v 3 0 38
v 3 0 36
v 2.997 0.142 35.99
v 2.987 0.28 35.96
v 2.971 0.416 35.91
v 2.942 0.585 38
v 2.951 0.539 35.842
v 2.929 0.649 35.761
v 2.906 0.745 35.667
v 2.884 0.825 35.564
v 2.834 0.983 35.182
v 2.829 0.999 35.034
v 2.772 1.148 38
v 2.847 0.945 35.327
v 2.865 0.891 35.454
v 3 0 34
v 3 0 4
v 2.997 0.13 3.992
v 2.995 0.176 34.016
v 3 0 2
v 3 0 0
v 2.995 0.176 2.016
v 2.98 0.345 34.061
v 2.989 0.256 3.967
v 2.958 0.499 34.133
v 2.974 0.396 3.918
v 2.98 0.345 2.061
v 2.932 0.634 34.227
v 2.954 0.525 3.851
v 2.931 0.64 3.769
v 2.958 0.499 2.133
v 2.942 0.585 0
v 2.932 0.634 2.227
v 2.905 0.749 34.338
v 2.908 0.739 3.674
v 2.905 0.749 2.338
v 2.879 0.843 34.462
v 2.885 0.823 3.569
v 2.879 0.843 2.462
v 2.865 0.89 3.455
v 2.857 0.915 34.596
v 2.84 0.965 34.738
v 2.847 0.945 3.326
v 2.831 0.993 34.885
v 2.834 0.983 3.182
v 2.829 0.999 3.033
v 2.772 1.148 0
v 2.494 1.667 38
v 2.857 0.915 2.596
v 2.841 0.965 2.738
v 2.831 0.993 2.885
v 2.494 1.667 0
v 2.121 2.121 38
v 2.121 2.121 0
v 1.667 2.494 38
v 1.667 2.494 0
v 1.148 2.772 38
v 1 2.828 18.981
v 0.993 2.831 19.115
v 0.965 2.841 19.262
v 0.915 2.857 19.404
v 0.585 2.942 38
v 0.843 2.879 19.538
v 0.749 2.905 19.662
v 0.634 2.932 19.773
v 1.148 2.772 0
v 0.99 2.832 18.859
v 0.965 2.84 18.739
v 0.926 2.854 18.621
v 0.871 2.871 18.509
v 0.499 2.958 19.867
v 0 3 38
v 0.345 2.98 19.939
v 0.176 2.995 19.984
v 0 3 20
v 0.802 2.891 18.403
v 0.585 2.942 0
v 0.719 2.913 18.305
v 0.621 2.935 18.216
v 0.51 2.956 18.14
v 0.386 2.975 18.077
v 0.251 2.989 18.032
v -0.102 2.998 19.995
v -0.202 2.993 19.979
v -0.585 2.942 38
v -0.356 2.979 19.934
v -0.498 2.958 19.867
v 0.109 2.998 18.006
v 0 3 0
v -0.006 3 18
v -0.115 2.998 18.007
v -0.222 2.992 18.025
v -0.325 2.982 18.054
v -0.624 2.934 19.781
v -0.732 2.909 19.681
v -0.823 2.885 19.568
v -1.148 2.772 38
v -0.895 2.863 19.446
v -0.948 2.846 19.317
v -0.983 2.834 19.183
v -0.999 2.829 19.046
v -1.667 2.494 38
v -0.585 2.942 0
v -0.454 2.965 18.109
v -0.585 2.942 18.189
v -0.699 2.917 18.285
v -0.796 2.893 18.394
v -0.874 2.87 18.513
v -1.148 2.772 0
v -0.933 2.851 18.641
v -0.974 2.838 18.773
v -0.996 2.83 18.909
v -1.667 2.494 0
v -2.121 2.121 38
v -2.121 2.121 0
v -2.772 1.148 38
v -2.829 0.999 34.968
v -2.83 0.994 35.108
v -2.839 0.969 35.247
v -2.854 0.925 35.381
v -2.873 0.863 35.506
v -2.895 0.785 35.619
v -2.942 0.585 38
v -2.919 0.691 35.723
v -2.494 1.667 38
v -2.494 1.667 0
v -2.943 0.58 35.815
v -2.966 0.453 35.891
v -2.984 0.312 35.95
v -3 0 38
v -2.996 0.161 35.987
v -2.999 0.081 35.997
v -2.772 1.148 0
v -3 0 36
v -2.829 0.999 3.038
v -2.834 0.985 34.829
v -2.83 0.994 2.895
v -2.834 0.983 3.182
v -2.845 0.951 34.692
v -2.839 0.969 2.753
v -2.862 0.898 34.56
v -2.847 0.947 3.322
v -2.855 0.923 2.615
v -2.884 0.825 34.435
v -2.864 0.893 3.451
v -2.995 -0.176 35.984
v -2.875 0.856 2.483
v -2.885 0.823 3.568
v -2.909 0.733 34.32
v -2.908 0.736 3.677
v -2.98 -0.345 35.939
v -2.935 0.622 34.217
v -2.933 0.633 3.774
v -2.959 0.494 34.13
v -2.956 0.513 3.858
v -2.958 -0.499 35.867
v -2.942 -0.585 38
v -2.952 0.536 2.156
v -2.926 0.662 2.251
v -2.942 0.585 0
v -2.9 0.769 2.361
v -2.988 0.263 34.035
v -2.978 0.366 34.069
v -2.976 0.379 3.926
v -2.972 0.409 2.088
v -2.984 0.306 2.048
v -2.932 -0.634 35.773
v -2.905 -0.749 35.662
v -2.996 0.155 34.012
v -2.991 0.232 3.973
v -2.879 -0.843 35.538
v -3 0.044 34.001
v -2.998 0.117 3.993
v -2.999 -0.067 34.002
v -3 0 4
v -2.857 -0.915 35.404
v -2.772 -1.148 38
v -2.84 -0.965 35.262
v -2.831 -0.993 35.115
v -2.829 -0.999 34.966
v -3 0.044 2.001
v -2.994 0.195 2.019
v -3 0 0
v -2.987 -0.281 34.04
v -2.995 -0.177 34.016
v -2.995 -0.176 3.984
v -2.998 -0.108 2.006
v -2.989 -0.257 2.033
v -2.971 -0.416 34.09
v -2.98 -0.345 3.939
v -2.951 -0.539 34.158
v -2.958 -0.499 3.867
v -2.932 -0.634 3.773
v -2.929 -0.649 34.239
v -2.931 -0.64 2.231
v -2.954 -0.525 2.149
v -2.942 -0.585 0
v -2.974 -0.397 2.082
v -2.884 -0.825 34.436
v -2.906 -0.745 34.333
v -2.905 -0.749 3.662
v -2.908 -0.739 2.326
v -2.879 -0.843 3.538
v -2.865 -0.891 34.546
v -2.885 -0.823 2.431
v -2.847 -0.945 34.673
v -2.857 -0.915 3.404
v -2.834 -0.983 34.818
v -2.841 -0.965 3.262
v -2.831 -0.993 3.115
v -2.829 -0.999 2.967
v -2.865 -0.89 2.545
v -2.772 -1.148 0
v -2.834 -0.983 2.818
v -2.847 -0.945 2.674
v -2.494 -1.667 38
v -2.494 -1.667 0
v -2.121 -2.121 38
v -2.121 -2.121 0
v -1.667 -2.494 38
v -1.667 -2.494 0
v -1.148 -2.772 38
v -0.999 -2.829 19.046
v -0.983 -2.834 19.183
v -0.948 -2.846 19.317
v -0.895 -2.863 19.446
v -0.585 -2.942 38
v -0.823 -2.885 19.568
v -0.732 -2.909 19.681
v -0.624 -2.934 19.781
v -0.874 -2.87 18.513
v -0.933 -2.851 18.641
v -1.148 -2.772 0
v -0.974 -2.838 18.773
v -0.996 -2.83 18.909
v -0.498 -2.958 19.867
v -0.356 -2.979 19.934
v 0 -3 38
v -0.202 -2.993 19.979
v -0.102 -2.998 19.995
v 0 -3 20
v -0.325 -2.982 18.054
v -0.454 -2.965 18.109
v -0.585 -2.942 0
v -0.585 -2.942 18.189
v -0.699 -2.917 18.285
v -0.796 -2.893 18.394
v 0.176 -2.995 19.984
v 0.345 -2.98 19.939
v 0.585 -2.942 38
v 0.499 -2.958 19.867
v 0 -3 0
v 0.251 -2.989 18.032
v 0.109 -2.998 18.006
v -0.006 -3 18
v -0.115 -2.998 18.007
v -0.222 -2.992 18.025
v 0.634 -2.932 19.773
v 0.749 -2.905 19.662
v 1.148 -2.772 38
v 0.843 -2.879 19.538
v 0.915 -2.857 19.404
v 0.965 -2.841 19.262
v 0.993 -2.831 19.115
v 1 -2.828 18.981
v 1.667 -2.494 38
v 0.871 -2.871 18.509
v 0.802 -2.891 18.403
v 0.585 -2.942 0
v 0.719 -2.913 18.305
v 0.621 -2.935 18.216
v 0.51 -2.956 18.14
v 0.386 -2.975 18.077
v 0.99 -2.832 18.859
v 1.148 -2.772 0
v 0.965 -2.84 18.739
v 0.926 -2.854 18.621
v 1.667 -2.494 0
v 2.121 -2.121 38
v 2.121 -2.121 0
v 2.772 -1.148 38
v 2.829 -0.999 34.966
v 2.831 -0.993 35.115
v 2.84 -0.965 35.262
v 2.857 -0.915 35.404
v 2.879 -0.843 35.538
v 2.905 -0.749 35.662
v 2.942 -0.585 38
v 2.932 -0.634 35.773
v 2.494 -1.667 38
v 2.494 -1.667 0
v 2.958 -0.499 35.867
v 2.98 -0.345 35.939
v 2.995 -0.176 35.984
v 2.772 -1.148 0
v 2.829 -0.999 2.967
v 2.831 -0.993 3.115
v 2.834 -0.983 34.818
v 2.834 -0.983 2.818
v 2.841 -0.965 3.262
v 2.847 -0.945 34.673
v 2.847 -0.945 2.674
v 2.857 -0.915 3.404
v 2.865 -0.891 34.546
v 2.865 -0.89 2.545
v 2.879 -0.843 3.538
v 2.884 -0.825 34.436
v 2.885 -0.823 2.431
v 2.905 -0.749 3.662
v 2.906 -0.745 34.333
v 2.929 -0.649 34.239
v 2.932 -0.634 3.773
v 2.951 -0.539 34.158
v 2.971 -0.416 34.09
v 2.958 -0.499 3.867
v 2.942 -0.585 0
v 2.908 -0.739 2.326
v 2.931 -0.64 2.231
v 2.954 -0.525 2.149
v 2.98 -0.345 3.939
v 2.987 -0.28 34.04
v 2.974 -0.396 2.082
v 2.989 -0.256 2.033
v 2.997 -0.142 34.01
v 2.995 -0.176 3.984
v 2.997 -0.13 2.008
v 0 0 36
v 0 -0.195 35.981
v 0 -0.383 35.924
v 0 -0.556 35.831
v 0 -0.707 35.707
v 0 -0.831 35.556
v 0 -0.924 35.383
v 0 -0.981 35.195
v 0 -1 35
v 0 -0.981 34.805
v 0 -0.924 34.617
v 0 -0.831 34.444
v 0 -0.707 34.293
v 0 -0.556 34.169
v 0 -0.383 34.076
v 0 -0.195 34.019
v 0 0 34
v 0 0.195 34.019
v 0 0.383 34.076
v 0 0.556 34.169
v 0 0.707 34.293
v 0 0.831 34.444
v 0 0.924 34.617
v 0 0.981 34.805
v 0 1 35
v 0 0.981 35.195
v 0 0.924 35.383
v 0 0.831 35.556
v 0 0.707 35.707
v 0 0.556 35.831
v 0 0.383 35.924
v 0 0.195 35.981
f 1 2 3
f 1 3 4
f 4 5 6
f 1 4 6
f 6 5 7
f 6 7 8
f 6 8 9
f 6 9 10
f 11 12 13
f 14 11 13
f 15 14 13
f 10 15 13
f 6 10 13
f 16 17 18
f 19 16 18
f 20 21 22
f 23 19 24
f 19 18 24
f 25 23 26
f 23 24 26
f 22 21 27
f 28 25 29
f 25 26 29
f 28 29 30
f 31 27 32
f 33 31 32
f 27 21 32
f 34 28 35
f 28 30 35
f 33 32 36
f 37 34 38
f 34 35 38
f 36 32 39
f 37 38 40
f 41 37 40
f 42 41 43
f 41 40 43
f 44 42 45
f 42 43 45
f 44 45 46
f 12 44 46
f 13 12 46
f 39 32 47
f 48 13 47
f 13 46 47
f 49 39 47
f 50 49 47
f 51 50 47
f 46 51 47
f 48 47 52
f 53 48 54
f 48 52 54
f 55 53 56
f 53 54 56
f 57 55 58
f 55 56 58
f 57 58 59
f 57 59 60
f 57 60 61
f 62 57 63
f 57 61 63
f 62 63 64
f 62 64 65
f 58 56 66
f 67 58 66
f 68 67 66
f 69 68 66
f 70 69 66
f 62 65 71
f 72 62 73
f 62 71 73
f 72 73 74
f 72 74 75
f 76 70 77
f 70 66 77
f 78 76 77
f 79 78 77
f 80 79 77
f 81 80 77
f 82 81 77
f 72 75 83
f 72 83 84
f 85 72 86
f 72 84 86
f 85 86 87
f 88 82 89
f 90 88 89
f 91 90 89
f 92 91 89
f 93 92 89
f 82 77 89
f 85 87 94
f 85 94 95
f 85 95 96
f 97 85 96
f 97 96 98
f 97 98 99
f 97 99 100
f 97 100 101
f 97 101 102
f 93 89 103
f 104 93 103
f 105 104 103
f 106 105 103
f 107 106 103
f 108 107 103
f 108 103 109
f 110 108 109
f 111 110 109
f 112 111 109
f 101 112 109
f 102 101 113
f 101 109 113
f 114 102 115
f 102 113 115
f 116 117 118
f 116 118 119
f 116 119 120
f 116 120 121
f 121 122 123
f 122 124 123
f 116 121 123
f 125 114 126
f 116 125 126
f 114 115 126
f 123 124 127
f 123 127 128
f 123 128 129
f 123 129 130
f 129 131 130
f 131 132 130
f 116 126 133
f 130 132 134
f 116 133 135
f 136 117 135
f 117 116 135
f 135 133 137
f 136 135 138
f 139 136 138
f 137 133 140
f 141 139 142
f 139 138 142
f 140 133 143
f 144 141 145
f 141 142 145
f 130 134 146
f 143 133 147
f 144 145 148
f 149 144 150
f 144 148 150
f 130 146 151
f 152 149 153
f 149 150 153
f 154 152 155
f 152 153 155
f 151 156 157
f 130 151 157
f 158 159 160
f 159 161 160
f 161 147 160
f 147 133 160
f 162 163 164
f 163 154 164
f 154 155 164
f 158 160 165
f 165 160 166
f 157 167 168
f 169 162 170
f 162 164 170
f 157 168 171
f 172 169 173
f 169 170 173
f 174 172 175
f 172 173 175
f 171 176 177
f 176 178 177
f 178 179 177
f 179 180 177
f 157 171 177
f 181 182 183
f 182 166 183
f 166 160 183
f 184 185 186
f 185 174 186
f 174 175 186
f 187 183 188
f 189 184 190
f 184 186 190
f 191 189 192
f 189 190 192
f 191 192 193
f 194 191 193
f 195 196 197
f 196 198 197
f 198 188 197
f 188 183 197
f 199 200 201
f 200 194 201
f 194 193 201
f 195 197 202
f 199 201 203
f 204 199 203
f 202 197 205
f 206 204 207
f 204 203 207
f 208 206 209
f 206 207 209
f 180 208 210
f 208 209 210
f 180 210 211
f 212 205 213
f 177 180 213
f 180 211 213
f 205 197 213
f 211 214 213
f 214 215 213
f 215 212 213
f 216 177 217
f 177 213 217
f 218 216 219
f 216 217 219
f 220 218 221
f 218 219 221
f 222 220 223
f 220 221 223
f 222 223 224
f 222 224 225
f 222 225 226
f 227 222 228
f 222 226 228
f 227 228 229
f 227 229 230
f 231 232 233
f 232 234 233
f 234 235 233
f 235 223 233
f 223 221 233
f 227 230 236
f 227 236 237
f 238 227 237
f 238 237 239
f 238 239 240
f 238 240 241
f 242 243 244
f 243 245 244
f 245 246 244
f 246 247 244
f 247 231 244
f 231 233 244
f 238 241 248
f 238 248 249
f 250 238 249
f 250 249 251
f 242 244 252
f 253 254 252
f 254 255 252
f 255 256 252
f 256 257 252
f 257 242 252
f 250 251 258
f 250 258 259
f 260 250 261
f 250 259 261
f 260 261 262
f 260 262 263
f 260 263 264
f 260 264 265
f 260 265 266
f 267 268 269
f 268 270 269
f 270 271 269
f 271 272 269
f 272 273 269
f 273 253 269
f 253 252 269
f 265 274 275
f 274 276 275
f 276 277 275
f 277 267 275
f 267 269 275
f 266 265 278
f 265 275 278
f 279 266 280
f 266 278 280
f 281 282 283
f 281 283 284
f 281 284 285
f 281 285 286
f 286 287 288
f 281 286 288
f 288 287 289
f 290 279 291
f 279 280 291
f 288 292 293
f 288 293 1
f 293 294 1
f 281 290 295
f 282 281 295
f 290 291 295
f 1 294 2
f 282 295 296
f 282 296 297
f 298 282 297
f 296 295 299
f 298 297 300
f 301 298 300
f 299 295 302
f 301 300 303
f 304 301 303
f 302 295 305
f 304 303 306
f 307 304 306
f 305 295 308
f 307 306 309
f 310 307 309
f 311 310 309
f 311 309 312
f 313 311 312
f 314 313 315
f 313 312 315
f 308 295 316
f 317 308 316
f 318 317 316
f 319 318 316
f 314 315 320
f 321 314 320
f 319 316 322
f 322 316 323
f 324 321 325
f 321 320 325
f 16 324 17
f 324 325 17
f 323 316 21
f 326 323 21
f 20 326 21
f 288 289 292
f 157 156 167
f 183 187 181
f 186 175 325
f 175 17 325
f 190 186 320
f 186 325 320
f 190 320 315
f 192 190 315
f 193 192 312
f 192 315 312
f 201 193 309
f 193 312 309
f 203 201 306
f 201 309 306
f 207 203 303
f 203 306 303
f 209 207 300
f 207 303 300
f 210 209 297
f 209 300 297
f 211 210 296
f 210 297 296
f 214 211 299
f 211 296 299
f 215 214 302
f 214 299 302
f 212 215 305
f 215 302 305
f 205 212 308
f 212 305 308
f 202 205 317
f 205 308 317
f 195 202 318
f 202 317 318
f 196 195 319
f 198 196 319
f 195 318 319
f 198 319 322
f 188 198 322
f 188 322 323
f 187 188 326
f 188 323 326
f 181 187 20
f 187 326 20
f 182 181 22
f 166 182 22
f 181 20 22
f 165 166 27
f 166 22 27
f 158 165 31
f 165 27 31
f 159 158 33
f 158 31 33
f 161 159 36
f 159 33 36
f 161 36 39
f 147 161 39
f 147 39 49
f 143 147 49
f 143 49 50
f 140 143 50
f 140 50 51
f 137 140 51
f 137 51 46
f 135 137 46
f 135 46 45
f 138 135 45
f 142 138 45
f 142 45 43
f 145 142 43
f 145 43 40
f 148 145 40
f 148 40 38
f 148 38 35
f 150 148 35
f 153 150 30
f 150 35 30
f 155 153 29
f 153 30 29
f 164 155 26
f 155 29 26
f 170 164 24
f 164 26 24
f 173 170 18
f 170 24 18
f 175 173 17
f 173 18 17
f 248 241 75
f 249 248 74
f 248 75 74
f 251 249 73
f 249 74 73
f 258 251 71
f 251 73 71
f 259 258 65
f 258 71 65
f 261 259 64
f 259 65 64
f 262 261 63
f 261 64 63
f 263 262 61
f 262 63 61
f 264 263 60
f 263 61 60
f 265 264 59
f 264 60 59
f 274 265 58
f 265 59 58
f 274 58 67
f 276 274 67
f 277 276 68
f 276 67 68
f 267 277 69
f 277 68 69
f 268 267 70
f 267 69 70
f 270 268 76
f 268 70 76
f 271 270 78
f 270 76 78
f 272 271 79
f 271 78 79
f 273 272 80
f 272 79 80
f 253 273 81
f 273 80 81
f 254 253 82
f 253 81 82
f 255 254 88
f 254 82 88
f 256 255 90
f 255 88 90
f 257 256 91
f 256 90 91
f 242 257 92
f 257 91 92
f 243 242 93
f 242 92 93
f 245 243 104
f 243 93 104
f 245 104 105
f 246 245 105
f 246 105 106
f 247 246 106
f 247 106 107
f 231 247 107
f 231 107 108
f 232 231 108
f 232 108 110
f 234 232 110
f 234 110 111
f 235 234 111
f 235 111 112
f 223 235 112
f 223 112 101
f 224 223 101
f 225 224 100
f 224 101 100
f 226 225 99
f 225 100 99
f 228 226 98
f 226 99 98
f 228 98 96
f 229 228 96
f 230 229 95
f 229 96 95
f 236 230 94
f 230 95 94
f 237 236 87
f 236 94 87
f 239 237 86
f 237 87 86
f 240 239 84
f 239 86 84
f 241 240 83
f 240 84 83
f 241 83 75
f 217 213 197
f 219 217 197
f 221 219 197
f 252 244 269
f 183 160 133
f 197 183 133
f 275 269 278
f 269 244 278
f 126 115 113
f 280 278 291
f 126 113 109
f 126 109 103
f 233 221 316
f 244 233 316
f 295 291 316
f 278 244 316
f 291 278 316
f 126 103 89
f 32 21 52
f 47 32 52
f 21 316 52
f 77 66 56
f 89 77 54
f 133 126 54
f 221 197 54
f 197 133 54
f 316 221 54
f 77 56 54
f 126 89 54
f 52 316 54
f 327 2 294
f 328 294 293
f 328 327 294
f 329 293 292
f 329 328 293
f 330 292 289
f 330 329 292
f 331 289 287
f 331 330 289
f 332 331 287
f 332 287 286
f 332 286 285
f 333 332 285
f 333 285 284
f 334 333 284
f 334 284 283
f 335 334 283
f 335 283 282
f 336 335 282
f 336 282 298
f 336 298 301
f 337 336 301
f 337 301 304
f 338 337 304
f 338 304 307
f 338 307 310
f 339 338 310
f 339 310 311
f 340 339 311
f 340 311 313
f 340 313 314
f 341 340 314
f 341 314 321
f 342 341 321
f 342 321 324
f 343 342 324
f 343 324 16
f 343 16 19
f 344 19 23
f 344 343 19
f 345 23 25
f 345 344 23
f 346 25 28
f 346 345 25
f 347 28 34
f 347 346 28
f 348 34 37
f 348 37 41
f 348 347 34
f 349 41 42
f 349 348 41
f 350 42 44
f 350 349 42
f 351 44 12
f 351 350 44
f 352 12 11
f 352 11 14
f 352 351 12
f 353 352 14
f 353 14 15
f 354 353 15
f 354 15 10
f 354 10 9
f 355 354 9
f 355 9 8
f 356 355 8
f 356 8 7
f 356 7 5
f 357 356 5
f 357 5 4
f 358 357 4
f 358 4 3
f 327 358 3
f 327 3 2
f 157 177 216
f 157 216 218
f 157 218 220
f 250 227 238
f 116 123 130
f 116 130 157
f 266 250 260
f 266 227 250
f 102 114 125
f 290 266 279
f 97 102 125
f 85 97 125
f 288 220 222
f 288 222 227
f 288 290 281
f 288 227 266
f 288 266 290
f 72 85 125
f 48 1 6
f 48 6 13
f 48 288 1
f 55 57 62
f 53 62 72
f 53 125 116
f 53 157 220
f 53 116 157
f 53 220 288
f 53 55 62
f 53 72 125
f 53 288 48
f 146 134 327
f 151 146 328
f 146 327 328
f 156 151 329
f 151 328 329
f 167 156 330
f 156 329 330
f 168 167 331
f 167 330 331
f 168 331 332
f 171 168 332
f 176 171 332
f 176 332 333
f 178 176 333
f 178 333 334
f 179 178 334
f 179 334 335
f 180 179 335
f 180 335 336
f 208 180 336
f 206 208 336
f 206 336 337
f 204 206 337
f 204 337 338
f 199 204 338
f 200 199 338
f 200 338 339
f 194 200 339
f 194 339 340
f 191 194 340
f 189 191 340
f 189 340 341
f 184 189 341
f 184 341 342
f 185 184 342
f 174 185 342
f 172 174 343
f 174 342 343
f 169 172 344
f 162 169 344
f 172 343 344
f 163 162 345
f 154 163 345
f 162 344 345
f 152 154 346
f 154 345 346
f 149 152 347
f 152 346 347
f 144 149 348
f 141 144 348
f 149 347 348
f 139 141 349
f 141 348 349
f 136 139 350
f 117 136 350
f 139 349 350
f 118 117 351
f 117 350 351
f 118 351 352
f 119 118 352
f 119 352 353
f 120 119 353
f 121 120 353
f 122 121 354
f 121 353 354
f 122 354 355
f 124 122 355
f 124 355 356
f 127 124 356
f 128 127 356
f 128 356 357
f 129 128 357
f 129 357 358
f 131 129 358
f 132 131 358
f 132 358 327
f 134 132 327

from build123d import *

# Parameters (mm, degrees)
SKETCH1_R           = 3
BOSS_EXTRUDE1_DEPTH = 38
SKETCH2_R           = 1
CUT_EXTRUDE3_DEPTH  = 19
SKETCH4_R           = 1
CUT_EXTRUDE4_DEPTH  = 19


with BuildPart() as part:
    # Sketch1 → Boss-Extrude1 (new body)
    with BuildSketch(Plane.XY):
        Circle(SKETCH1_R)
    extrude(amount=BOSS_EXTRUDE1_DEPTH)

    # Sketch2 → Cut-Extrude3 (cut, symmetric)
    with BuildSketch(Plane(origin=(0, 0, 0), x_dir=(1, 0, 0), z_dir=(0, 1, 0))):
        with Locations(Location((0, -19, 0), (0, 0, 270))):
            Circle(SKETCH2_R)
    extrude(amount=CUT_EXTRUDE3_DEPTH, both=True, mode=Mode.SUBTRACT)

    # Sketch4 → Cut-Extrude4 (cut, symmetric)
    with BuildSketch(Plane(origin=(0, 0, 0), x_dir=(0, 0, -1), z_dir=(1, 0, 0))):
        with Locations(Location((-35, 0, 0), (0, 0, 180))):
            Circle(SKETCH4_R)
        with Locations(Location((-3, 0, 0), (0, 0, 180))):
            Circle(SKETCH4_R)
    extrude(amount=CUT_EXTRUDE4_DEPTH, both=True, mode=Mode.SUBTRACT)


solid = part.part
